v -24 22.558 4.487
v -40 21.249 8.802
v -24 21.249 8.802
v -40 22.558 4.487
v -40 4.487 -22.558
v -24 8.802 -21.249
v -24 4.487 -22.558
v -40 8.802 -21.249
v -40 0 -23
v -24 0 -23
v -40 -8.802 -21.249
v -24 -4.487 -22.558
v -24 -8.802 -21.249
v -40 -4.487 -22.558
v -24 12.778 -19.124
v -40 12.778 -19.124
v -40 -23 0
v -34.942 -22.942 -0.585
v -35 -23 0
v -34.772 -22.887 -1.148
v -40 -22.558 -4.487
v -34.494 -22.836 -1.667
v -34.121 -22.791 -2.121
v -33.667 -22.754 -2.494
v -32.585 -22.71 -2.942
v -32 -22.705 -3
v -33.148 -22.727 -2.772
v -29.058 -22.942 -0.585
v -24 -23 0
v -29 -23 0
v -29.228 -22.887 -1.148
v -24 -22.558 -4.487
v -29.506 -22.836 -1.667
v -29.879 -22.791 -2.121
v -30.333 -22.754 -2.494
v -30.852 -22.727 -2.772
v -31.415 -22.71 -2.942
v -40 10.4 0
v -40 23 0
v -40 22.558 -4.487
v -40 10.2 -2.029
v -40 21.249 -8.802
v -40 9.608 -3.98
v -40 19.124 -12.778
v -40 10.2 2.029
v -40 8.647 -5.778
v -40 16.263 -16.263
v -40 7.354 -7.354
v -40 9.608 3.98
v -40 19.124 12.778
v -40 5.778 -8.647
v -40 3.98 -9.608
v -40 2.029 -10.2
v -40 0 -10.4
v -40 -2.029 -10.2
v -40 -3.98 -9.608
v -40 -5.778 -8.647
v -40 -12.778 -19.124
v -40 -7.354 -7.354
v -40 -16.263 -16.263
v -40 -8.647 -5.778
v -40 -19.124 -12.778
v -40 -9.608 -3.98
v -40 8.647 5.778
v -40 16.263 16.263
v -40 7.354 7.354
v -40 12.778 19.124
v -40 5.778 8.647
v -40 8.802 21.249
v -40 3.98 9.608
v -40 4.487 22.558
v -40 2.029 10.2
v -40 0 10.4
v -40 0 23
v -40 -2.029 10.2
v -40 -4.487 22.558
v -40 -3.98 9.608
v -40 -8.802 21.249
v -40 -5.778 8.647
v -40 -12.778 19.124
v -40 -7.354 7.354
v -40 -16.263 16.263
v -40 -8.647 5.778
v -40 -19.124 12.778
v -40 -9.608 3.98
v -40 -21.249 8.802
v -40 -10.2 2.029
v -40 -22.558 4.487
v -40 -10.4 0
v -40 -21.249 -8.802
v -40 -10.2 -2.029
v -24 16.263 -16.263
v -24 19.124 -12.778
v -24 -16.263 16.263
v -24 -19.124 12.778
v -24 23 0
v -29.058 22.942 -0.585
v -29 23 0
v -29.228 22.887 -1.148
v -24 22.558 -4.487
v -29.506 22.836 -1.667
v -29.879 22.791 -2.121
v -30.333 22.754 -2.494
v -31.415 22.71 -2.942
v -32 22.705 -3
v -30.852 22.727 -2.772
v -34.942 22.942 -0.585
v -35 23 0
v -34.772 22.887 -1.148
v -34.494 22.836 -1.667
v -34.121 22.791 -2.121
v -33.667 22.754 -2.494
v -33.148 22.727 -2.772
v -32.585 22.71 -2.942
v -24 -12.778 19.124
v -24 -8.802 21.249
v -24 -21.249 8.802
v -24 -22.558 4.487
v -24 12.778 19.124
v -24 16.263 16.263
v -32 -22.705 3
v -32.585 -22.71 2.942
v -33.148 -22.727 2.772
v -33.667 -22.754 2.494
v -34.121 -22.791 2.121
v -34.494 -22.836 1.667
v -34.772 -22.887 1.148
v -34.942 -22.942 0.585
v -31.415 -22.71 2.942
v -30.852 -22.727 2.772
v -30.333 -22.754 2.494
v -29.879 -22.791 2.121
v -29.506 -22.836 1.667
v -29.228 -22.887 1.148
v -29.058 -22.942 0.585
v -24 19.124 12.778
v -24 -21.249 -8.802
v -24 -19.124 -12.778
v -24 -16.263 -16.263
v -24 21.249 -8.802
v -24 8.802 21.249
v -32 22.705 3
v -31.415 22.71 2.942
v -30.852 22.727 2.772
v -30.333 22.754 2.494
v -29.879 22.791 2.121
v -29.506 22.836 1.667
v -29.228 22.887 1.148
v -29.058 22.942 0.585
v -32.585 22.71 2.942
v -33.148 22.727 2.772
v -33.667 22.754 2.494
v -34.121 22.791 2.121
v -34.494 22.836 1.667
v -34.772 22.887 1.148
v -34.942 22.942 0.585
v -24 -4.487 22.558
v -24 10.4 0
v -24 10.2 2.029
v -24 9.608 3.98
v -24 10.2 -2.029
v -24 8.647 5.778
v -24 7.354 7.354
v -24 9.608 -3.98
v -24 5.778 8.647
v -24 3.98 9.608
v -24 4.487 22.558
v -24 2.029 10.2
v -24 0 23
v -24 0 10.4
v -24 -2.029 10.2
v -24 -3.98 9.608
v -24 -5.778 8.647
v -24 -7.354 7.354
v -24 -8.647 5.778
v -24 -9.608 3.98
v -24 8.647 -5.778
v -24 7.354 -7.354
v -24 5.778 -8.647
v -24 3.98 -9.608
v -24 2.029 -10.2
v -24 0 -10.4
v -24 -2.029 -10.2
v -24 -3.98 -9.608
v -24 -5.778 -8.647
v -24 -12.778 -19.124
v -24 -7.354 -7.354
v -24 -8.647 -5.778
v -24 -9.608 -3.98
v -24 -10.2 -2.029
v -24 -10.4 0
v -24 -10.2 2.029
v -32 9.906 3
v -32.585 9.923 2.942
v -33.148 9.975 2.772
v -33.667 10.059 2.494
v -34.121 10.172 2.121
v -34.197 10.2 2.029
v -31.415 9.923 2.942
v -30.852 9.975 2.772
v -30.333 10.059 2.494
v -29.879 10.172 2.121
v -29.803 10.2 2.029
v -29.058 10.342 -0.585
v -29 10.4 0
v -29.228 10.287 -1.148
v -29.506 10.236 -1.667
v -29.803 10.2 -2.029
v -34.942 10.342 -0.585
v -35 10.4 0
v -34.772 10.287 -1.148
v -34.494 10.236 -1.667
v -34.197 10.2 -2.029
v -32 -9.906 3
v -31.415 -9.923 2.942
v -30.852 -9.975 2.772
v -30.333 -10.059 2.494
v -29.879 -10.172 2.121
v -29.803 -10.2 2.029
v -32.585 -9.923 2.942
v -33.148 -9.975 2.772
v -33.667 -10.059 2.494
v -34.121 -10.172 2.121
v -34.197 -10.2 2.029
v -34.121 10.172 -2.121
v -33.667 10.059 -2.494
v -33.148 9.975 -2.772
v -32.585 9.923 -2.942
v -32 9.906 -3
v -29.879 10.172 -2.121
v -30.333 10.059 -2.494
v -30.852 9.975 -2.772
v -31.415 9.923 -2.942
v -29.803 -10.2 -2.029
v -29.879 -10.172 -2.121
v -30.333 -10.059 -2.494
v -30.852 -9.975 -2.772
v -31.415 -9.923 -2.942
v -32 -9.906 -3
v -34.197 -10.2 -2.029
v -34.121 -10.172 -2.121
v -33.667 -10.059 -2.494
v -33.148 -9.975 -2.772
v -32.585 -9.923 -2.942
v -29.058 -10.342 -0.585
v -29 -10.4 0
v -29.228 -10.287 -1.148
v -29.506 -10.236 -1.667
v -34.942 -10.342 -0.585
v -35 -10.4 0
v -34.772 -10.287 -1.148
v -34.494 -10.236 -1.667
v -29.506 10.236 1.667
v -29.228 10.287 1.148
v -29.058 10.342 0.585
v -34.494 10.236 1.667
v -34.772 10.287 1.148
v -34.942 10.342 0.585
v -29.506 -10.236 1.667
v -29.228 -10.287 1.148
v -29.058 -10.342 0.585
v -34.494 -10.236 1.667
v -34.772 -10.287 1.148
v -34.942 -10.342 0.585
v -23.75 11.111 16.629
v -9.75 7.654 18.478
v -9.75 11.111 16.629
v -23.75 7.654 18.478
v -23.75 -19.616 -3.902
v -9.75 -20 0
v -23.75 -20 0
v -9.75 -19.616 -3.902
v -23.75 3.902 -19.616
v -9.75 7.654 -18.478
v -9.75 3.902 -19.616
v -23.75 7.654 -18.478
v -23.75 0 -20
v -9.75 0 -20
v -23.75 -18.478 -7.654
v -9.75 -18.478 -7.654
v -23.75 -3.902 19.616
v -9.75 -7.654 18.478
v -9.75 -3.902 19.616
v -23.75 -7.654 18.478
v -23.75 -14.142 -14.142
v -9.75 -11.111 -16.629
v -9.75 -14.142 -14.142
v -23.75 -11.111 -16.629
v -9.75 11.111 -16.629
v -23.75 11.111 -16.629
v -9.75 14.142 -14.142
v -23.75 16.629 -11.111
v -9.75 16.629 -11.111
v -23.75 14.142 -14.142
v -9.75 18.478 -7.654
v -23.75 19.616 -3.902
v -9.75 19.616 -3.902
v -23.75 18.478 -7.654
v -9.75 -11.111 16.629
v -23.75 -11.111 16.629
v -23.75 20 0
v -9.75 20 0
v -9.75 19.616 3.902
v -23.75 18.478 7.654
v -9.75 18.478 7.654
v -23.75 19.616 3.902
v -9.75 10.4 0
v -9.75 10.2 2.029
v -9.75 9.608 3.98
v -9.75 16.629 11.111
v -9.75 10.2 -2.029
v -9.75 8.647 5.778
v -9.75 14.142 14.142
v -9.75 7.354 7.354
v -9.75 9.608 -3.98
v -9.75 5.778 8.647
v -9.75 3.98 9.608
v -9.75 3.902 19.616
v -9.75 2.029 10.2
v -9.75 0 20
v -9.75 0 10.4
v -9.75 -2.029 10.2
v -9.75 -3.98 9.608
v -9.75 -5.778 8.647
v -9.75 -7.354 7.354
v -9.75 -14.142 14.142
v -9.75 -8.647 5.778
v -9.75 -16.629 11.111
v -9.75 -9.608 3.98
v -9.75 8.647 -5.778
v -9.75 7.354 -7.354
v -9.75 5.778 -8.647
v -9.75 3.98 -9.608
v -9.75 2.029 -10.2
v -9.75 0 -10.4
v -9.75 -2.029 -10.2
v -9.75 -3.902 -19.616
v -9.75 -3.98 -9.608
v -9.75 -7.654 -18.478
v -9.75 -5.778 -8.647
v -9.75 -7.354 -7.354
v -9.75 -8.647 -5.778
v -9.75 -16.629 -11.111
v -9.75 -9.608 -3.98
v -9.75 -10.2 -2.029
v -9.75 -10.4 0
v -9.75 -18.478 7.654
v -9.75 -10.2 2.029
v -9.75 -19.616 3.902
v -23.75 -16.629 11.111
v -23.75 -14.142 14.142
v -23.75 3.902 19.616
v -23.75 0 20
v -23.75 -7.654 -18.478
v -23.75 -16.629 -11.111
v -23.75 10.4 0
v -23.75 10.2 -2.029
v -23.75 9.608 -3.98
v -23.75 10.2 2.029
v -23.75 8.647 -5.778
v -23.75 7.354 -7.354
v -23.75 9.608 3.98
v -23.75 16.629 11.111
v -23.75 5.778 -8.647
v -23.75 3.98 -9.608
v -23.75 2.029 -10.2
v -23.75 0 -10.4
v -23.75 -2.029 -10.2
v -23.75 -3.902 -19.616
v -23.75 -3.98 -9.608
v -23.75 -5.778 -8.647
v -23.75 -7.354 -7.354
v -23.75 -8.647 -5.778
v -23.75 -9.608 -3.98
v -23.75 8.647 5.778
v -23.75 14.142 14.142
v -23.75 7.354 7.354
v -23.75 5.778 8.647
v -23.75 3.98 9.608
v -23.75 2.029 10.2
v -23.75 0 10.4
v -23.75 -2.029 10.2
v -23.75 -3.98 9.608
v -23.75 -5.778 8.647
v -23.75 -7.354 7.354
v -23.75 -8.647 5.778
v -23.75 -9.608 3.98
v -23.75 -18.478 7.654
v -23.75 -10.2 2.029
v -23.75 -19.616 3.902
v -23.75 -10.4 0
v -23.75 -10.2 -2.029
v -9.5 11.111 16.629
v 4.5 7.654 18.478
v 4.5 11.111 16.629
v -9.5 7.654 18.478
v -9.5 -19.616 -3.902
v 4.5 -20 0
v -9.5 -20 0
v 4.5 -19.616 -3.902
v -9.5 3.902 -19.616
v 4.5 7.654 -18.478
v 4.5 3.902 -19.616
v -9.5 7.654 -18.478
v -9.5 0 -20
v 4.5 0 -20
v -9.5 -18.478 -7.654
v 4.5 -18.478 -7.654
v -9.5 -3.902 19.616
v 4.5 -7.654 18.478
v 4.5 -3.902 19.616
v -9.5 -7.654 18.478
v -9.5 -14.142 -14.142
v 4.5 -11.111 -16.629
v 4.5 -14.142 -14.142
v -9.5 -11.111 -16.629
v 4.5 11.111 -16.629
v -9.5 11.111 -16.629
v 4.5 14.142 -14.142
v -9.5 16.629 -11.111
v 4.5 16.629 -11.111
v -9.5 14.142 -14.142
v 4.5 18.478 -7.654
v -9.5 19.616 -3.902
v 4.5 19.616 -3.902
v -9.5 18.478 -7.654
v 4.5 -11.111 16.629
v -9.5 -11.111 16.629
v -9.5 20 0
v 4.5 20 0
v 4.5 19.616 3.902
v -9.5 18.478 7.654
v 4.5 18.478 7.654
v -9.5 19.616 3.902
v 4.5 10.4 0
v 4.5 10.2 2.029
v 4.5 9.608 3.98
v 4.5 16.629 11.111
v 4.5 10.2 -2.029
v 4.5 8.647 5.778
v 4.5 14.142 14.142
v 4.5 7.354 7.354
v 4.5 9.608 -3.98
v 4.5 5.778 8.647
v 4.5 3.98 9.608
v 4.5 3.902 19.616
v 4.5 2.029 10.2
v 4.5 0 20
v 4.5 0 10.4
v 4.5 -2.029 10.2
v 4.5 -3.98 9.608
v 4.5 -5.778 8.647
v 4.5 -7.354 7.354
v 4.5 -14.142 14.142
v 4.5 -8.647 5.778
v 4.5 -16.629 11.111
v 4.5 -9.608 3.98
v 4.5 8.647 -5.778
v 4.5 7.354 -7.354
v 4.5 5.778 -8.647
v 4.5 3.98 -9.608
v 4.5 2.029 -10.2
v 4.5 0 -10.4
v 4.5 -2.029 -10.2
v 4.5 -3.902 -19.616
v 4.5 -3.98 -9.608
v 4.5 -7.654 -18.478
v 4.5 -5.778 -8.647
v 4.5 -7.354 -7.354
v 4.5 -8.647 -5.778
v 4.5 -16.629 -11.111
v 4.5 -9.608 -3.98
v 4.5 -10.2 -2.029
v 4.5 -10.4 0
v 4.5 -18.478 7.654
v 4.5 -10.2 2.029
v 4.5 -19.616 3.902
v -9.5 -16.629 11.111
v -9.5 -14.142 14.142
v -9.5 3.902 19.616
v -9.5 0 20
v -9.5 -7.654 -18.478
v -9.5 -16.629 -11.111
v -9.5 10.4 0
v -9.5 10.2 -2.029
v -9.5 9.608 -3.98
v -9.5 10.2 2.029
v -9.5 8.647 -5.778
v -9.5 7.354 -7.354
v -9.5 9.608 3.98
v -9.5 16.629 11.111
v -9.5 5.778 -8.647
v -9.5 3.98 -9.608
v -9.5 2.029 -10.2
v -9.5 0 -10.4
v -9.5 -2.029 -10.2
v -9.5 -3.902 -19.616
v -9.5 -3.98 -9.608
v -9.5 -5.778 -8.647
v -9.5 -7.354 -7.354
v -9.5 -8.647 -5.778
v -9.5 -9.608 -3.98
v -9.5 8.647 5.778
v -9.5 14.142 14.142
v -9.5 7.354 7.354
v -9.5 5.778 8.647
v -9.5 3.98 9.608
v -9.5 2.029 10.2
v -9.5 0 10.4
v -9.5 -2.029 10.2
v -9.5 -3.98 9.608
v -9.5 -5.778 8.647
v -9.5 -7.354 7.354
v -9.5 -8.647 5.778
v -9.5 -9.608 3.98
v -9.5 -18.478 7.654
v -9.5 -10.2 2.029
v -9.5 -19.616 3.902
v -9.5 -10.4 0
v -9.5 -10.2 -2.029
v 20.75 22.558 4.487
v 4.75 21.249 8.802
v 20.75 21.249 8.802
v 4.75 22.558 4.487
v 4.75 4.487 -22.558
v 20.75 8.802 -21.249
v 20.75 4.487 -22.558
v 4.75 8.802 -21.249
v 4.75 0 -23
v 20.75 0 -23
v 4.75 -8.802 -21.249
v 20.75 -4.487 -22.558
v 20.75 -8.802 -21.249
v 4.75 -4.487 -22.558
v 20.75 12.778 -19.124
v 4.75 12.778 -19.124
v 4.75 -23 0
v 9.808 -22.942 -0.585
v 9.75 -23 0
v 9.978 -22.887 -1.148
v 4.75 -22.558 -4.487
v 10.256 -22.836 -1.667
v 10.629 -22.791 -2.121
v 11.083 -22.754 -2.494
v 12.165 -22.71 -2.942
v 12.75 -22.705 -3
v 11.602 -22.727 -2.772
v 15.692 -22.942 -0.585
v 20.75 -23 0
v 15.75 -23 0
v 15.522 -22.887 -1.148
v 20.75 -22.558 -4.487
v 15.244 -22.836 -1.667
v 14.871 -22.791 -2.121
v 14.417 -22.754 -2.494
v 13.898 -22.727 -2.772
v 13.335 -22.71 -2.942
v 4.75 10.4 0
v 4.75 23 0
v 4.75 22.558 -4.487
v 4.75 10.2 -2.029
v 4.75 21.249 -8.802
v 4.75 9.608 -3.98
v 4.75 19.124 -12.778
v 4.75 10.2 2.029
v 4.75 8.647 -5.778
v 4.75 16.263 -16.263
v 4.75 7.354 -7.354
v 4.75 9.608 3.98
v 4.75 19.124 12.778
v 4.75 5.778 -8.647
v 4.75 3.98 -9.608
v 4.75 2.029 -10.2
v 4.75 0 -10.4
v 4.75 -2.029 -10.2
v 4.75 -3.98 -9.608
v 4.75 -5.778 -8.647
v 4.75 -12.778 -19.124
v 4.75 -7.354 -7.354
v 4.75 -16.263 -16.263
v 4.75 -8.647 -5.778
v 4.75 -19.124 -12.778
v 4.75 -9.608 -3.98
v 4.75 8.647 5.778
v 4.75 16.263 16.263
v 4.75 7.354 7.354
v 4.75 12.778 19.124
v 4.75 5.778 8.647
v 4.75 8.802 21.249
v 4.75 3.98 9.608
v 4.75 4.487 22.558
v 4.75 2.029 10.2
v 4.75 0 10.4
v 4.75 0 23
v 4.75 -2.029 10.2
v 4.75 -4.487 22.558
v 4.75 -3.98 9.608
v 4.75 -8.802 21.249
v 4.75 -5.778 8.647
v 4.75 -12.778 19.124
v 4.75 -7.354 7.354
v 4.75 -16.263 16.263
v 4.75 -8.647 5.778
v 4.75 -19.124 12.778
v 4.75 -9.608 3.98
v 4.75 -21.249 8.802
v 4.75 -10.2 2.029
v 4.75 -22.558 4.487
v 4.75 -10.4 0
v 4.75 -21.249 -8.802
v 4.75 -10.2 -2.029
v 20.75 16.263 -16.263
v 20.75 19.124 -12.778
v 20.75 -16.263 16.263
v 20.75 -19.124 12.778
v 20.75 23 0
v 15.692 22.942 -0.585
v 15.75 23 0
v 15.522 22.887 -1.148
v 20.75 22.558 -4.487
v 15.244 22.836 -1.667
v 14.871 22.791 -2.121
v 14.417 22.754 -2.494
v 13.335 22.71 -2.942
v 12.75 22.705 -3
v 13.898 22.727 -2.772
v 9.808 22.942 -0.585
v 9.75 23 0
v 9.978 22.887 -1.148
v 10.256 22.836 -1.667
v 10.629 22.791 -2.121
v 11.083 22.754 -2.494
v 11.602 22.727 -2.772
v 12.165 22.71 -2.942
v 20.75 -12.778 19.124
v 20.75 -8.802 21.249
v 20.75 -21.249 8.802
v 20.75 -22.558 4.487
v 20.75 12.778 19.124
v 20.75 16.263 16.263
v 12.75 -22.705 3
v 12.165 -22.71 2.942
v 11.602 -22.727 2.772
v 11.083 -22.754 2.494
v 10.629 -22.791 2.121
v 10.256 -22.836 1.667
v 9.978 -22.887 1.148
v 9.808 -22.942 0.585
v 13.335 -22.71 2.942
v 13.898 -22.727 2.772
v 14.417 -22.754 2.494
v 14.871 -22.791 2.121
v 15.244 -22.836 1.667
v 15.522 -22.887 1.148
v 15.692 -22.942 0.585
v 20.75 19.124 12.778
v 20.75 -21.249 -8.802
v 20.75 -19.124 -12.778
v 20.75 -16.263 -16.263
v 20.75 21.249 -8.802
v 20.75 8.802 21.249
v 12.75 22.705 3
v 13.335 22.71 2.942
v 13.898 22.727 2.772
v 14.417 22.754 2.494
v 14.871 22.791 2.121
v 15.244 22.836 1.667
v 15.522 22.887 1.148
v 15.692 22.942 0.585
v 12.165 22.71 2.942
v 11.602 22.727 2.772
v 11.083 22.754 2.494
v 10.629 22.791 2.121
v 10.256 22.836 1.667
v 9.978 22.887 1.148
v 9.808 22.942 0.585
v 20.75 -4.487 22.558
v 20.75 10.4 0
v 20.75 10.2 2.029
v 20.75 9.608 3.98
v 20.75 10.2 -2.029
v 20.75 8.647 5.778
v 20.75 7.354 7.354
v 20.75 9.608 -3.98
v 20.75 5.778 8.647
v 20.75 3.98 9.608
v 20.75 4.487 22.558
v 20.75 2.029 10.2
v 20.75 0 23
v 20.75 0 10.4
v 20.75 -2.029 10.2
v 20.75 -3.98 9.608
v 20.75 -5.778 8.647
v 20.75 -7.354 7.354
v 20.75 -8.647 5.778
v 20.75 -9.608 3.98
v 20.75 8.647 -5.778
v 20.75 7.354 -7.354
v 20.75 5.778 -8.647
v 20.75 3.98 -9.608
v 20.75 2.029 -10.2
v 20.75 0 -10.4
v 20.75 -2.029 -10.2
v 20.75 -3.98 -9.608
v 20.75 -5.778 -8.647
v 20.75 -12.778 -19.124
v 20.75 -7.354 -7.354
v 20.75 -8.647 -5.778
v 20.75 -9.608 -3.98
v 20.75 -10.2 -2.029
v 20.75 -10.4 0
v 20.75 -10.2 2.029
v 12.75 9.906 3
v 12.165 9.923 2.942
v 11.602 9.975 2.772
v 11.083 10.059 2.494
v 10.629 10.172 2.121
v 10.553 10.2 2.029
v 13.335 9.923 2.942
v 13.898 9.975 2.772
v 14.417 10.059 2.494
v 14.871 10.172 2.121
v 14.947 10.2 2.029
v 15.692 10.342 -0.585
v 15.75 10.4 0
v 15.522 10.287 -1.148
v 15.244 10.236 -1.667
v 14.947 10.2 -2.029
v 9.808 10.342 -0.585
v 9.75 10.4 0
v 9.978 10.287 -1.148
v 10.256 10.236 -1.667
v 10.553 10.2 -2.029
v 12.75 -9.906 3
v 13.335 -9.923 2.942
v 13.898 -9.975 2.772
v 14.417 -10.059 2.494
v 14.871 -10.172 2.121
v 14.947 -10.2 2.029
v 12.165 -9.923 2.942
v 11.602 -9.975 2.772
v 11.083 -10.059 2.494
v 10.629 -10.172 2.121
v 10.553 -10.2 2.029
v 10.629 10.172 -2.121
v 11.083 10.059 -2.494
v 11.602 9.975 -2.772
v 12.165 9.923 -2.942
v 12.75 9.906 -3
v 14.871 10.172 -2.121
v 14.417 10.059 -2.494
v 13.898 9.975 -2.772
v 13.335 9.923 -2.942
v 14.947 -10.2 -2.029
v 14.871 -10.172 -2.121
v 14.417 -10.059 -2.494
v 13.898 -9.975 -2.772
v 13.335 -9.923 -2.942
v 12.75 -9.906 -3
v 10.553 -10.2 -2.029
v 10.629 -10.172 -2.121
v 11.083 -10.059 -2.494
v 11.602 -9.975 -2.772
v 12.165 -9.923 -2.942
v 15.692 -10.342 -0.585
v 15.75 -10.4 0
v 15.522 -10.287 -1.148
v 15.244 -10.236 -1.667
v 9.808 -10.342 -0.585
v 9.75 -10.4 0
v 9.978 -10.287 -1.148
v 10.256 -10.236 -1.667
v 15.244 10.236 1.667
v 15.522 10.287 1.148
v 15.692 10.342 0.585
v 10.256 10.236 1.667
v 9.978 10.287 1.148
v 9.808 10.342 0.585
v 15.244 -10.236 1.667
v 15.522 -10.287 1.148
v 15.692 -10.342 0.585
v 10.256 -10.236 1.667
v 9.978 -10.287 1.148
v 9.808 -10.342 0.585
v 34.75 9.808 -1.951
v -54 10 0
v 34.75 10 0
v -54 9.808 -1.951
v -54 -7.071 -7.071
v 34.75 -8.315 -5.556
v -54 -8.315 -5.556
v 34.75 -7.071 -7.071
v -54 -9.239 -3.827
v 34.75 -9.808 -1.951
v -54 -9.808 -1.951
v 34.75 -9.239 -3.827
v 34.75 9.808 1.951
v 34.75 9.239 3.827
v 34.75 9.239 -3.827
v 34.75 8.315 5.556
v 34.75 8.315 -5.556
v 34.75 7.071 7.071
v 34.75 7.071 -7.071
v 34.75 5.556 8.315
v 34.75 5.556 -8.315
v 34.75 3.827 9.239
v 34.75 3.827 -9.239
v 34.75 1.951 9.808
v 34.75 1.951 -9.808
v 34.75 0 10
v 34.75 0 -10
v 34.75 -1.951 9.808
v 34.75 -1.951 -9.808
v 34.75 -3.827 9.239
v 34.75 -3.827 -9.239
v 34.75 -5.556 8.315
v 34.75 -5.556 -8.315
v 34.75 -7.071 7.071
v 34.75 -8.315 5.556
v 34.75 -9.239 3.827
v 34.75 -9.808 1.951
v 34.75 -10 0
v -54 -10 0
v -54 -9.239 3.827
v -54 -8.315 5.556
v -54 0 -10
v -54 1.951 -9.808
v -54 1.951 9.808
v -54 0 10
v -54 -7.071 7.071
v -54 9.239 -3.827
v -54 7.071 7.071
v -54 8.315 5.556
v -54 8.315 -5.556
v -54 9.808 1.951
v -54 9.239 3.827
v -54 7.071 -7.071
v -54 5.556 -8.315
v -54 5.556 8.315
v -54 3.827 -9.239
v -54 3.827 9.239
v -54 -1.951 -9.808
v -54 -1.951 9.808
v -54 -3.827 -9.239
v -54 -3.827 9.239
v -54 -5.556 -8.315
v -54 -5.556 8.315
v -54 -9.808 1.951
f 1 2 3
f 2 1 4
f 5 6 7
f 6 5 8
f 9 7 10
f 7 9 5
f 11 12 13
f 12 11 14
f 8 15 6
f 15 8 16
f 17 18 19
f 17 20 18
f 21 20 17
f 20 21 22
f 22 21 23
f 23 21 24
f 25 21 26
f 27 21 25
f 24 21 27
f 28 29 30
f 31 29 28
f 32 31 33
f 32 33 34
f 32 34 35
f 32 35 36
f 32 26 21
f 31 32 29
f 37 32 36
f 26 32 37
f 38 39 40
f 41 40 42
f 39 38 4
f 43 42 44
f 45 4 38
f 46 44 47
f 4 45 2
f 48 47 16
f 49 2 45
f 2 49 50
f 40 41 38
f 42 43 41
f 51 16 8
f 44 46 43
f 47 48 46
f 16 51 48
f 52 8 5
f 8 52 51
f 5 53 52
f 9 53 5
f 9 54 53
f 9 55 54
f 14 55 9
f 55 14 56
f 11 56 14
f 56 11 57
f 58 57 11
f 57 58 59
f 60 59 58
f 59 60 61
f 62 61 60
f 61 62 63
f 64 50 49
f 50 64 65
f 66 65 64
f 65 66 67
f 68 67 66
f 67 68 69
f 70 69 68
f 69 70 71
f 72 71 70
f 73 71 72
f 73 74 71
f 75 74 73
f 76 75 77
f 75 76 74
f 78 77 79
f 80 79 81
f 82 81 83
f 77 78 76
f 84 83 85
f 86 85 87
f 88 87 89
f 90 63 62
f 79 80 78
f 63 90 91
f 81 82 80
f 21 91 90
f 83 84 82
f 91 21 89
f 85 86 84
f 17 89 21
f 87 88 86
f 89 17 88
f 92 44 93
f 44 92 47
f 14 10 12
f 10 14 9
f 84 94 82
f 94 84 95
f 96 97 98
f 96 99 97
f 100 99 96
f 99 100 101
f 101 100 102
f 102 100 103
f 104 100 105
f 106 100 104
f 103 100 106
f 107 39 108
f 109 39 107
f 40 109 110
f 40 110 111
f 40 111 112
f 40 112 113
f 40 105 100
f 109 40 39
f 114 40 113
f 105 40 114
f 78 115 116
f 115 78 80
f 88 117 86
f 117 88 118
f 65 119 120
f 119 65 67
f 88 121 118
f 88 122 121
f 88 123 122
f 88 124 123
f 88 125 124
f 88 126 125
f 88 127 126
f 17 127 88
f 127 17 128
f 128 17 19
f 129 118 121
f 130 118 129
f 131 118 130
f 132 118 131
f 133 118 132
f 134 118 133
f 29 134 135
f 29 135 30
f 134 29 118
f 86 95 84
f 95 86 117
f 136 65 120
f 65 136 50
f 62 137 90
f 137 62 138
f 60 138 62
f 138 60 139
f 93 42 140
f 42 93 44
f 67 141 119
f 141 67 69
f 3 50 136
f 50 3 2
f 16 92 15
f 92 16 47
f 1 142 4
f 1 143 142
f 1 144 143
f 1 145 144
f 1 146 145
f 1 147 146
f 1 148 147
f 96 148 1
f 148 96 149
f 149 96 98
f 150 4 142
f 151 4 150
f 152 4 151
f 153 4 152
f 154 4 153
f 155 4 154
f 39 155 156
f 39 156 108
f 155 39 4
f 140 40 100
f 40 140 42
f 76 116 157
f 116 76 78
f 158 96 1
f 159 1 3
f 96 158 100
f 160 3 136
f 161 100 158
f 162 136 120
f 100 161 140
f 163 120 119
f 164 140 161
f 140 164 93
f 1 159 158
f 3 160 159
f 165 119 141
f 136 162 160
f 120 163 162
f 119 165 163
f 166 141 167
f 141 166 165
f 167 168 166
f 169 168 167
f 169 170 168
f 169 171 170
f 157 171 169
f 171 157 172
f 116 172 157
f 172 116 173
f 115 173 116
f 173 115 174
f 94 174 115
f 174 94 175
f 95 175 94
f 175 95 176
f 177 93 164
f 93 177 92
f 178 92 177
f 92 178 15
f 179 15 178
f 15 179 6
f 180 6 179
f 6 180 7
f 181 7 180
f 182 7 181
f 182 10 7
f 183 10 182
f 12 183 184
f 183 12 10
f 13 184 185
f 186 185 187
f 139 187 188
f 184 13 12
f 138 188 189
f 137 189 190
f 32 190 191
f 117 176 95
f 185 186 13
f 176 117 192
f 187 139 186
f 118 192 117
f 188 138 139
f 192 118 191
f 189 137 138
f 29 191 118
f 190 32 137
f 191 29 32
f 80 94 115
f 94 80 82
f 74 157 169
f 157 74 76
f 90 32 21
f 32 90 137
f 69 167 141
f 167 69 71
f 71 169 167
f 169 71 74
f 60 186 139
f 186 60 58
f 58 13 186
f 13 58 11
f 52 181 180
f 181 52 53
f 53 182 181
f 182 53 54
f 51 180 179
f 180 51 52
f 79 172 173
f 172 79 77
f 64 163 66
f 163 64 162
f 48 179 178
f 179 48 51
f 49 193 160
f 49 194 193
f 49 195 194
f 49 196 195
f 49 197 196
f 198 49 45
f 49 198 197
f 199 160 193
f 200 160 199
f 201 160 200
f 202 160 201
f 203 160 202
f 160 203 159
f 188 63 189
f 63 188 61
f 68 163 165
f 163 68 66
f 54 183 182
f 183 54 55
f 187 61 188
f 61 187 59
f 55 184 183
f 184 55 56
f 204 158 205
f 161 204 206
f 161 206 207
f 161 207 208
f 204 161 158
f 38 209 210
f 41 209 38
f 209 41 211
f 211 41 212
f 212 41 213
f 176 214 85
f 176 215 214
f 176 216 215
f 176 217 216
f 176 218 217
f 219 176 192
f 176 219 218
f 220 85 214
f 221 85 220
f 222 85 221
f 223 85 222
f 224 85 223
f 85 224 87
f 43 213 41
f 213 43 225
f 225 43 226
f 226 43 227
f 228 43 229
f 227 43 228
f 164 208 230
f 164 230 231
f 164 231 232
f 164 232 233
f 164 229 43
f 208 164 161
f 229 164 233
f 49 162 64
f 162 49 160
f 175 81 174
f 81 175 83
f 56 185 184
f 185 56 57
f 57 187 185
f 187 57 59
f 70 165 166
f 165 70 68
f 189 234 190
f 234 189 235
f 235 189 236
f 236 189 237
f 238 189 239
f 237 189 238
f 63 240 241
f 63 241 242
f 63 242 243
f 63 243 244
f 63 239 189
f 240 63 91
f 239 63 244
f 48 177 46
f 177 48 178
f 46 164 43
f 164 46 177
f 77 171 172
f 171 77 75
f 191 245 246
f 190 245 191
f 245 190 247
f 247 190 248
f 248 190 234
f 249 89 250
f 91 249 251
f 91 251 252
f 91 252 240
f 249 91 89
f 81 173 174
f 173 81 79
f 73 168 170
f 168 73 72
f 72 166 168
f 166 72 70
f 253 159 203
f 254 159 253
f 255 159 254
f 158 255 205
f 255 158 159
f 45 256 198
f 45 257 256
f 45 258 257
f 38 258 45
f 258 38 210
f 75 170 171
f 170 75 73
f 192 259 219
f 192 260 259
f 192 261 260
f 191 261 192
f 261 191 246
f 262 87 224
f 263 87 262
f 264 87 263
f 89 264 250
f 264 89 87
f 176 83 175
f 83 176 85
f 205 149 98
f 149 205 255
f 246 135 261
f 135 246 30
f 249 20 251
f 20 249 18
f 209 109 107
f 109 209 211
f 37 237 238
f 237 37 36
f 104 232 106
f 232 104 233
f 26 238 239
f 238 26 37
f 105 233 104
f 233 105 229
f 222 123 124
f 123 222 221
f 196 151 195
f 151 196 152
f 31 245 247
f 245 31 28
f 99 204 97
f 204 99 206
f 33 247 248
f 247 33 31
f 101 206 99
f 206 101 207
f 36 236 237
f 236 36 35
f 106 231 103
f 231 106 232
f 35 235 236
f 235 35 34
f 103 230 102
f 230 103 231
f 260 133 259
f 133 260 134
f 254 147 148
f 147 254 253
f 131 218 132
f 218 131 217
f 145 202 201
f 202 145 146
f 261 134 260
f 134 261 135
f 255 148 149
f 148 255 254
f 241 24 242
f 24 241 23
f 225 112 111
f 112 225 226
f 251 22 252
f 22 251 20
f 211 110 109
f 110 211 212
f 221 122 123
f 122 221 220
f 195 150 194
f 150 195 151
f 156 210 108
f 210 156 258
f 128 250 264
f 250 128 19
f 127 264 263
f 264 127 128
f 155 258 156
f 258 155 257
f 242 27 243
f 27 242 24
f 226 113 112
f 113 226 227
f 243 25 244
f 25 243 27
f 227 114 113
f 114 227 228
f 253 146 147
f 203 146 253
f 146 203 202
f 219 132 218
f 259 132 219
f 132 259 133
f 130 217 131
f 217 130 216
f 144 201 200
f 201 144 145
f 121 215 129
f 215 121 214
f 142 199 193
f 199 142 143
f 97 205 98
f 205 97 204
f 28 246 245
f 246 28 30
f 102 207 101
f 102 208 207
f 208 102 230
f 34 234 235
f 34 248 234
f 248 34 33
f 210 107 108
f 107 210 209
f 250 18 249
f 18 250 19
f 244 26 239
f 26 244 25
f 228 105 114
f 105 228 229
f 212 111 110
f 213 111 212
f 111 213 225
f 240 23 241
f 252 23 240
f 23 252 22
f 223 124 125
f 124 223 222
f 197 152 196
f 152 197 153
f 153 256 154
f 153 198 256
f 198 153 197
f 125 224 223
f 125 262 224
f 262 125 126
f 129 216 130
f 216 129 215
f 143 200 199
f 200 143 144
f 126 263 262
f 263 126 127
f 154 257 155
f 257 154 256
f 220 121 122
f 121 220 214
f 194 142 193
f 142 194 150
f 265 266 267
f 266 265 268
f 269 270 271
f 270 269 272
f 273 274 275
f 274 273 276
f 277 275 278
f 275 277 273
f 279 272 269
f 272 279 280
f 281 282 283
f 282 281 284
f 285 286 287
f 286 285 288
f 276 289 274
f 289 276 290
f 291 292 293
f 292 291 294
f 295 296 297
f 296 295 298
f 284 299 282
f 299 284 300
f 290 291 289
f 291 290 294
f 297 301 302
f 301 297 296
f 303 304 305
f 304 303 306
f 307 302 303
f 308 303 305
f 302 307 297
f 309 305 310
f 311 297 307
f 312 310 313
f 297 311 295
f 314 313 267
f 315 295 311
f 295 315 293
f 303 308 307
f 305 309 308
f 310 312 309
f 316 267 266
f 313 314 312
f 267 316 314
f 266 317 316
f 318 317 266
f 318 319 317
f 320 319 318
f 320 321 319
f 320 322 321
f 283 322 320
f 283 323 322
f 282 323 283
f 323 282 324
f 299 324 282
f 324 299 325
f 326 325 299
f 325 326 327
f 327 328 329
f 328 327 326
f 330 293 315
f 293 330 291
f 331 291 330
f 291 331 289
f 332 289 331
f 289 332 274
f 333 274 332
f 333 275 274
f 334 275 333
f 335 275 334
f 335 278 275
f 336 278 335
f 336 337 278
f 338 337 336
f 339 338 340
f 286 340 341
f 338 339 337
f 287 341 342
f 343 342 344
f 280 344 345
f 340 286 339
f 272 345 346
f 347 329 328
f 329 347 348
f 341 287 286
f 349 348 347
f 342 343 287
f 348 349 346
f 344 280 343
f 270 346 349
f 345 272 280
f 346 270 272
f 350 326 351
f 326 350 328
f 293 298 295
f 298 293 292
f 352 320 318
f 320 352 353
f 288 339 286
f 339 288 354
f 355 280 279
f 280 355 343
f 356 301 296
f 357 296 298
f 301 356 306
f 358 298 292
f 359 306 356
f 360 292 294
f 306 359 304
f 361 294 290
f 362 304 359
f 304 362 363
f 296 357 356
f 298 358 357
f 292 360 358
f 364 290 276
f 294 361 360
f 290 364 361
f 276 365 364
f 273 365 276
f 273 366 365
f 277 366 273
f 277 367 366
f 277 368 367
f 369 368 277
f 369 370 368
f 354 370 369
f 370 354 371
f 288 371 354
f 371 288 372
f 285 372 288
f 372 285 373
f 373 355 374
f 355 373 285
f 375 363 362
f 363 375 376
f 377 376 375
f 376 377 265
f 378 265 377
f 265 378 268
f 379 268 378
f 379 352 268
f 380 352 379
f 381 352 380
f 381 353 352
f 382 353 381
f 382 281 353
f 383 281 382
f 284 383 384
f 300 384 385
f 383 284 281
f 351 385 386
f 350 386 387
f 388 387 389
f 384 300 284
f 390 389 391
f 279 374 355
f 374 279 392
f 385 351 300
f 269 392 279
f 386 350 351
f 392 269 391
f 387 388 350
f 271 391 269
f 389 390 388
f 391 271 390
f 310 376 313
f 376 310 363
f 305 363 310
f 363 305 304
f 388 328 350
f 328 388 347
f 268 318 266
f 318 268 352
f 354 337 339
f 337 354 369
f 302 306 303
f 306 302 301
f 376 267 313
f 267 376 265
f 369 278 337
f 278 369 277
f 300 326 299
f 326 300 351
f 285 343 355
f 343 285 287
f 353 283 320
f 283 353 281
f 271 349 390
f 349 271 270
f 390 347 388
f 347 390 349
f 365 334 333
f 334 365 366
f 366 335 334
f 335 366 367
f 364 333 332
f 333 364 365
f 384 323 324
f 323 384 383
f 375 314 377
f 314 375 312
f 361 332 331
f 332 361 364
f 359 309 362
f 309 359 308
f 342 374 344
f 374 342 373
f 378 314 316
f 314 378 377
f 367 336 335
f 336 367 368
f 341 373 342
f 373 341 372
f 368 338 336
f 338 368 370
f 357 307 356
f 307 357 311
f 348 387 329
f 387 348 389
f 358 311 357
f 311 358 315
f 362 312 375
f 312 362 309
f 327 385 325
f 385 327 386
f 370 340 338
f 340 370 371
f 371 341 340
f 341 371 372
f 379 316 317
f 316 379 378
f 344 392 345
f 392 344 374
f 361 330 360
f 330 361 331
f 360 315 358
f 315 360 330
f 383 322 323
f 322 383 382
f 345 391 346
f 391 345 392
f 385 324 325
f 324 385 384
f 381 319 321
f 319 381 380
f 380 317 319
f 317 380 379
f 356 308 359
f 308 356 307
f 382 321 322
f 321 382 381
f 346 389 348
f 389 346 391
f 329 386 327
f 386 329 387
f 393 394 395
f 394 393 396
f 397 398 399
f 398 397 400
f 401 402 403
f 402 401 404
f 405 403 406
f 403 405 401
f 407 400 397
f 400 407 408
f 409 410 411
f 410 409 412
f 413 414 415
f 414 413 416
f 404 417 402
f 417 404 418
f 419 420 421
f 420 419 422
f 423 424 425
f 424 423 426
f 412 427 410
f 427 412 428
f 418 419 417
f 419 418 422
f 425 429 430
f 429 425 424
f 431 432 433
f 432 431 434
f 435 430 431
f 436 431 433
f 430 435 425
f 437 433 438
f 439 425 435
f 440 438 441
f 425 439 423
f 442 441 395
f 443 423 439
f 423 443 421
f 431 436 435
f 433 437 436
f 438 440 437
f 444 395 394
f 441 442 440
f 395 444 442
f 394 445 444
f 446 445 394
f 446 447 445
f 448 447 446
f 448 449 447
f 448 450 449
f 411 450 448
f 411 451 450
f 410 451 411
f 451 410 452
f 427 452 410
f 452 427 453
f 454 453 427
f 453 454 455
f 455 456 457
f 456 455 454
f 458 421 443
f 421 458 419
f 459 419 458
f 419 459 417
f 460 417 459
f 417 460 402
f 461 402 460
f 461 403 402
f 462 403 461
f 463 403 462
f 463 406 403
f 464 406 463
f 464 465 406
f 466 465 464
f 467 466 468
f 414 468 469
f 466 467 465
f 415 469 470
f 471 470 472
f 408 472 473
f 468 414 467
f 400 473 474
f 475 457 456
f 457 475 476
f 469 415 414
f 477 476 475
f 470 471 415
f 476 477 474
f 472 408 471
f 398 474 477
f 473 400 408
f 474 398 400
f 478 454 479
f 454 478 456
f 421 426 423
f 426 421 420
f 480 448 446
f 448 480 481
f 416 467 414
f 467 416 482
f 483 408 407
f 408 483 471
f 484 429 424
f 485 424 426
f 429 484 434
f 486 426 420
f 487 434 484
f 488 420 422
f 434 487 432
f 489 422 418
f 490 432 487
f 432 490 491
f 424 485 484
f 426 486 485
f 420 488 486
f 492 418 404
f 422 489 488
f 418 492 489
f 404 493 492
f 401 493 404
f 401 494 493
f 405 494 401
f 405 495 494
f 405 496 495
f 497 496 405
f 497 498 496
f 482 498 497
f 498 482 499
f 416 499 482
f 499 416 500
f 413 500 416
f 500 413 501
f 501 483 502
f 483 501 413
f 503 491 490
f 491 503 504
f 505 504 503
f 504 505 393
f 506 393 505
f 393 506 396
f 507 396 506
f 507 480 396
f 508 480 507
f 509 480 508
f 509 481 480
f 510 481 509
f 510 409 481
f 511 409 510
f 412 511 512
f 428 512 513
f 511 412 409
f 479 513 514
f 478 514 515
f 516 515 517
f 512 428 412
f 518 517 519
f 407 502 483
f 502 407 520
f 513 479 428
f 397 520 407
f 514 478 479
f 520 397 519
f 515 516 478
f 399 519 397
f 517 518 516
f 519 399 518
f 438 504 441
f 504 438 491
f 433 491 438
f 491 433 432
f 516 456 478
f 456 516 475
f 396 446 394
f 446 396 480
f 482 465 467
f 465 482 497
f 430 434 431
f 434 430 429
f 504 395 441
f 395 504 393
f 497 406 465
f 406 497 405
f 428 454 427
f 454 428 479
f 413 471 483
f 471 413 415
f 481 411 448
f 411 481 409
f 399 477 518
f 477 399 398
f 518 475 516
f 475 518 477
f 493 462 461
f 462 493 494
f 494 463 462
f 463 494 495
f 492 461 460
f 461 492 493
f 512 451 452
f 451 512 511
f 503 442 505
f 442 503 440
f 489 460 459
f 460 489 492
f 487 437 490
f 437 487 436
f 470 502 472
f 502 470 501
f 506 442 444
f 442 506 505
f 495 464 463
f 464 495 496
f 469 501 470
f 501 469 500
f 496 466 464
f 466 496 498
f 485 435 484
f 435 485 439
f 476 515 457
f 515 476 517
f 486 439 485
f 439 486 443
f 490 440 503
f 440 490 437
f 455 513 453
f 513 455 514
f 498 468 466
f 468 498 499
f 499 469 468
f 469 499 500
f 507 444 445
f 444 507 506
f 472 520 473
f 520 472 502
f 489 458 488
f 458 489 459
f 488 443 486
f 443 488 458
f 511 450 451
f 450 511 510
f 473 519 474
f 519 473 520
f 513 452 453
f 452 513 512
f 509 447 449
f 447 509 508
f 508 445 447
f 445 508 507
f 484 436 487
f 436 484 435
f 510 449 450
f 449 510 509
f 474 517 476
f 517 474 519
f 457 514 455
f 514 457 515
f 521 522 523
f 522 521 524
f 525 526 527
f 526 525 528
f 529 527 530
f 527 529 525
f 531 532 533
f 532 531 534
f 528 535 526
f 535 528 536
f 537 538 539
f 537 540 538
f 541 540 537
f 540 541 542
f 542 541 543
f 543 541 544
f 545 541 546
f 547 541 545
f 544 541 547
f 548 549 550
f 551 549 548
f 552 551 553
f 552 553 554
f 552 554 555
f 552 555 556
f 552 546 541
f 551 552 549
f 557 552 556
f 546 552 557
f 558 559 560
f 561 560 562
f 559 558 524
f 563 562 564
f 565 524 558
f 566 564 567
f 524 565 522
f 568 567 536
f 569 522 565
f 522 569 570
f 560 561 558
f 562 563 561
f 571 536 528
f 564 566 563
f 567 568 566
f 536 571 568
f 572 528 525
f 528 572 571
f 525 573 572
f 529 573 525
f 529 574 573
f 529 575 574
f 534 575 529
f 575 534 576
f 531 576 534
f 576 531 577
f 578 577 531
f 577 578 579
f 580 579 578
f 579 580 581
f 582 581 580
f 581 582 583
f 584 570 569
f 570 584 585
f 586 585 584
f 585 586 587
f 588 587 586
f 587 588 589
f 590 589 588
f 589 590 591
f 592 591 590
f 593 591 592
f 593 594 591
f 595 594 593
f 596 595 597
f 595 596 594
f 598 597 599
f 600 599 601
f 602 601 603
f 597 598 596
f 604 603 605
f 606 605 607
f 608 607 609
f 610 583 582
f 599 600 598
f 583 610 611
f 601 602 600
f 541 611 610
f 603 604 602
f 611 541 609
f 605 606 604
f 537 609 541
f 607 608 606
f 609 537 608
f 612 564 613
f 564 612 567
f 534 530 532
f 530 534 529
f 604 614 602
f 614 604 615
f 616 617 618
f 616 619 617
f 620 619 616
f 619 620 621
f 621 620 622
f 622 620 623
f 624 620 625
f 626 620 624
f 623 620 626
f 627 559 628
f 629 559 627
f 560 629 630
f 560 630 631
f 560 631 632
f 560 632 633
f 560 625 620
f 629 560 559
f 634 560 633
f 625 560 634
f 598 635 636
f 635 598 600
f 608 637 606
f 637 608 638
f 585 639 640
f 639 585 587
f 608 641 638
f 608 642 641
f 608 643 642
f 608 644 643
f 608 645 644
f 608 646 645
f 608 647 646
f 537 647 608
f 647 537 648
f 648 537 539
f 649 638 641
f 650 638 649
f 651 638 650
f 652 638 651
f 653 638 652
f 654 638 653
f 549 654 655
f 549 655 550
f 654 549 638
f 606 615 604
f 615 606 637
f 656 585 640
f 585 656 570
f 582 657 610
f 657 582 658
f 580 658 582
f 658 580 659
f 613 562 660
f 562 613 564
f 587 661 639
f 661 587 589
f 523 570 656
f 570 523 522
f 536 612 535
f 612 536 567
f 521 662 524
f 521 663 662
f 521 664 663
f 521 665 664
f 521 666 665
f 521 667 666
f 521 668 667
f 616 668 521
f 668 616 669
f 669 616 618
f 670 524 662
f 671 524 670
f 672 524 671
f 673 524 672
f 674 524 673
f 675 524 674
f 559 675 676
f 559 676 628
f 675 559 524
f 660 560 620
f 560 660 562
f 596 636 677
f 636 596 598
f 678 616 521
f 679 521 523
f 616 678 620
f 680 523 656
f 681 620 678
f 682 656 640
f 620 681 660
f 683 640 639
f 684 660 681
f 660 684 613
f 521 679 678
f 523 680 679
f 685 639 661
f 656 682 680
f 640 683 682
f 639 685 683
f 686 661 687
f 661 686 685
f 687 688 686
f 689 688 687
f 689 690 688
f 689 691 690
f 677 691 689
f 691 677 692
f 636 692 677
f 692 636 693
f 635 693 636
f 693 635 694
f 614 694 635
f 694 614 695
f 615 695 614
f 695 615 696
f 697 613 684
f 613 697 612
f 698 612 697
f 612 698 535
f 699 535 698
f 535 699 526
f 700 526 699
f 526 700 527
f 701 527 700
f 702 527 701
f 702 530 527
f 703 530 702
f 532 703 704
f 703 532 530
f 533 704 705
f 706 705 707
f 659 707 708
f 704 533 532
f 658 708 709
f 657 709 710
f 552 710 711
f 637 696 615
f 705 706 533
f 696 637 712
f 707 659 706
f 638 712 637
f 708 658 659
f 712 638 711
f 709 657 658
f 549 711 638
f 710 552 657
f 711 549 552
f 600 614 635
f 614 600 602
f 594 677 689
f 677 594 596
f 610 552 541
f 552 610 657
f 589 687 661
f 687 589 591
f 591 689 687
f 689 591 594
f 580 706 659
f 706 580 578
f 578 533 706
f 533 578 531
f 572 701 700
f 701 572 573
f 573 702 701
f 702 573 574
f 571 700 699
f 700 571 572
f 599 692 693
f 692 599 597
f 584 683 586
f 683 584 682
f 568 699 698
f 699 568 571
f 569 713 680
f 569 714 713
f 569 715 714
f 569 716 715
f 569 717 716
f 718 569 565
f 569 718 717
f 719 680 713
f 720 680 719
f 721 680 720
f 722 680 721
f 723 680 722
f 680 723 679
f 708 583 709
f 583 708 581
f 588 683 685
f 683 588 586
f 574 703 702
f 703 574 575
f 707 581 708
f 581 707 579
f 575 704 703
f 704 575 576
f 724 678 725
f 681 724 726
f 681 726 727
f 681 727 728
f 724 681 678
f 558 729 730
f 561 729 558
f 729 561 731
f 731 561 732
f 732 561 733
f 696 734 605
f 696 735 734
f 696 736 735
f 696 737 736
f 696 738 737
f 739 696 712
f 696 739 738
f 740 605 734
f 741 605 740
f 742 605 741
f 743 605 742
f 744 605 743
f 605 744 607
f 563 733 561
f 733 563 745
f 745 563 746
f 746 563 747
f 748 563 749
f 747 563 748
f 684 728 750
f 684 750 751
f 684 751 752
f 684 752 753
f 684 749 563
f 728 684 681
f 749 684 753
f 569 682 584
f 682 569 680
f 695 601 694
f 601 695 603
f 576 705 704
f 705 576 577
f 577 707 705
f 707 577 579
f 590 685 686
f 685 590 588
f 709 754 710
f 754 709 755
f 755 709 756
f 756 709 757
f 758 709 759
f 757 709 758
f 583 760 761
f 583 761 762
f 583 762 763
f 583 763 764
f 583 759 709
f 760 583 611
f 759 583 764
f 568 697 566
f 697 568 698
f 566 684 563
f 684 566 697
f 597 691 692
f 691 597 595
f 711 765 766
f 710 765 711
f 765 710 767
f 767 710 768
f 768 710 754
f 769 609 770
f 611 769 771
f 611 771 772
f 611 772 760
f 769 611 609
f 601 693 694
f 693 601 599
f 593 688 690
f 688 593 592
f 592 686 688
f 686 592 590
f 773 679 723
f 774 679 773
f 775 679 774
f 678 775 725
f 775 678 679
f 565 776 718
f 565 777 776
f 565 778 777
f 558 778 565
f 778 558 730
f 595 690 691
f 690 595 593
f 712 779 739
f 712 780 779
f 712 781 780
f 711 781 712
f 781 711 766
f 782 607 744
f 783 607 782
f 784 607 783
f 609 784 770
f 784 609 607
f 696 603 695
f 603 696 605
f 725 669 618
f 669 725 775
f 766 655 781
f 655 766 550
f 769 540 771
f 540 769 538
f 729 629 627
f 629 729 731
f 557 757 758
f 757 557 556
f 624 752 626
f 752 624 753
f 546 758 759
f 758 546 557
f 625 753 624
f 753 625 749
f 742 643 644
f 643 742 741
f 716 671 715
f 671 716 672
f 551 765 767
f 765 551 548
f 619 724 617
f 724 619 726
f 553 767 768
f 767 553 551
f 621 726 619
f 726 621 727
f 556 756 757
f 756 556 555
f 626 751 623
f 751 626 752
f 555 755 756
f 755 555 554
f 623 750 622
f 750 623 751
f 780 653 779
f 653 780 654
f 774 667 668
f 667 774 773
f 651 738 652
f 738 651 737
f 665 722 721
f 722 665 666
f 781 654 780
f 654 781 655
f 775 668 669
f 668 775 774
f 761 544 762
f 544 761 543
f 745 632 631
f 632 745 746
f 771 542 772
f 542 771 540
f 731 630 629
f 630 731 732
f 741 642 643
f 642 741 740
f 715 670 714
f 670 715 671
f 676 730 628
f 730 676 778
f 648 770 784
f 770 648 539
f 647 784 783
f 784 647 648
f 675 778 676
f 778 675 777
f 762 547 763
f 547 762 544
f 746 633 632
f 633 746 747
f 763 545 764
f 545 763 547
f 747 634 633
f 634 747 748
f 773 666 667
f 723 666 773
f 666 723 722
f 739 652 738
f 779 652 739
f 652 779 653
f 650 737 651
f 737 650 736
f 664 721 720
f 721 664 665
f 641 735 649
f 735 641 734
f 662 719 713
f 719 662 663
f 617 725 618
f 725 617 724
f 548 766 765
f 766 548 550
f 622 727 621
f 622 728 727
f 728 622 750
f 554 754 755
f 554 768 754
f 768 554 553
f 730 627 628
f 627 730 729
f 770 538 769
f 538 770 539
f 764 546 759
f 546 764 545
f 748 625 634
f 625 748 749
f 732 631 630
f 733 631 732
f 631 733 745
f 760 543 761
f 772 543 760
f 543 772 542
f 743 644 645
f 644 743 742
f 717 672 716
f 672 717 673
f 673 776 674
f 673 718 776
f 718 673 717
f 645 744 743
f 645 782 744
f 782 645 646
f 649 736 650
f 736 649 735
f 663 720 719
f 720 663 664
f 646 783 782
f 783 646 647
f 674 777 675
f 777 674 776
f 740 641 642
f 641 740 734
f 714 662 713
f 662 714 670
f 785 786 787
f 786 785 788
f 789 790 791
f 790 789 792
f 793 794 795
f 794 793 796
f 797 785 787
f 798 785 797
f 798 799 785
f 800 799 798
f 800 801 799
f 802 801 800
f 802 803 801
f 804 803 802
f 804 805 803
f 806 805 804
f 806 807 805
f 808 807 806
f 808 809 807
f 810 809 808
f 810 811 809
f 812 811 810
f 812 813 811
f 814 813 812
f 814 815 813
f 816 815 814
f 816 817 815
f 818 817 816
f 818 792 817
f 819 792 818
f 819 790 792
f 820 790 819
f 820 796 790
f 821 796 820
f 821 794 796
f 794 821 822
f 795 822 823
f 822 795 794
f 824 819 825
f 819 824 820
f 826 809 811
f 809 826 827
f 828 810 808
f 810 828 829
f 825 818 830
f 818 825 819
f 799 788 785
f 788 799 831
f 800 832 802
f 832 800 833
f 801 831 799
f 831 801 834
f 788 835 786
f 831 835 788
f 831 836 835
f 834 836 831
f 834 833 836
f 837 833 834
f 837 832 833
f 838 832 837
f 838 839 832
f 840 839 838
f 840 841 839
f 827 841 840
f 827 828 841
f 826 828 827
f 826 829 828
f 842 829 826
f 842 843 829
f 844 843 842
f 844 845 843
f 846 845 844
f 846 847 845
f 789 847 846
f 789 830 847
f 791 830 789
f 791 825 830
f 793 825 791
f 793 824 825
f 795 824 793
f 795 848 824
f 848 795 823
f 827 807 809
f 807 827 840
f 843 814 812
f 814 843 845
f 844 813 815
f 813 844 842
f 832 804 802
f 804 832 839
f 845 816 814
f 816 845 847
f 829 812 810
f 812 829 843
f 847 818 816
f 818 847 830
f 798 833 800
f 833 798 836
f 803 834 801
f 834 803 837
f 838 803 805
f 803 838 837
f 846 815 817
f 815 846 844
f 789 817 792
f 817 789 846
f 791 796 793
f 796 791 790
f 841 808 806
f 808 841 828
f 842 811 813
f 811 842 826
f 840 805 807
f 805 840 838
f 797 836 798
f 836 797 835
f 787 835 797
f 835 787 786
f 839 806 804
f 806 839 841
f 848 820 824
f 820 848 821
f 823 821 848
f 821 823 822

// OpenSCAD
$fn = 32;

// ------------------------------------------------------------------------
// Shaft with rings and collars: d20 shaft, 4 rings
// Every part is its own module, assembly() places them once.
// ------------------------------------------------------------------------

// --- part 1 ---
module shaft() {
  translate([0, 0, -44.375]) cylinder(h = 88.75, d = 20);
}

// --- part 2 ---
module collar_a() {
  difference() {
    cylinder(h = 16, d = 46);
    translate([0, 0, -1]) cylinder(h = 18, d = 20.8);
    translate([0, 0, 8]) rotate([90, 0, 0]) cylinder(h = 48, d = 6, center = true);
  }
}

// --- part 3 ---
module spacer_a() {
  difference() {
      translate([0, 0, 0]) cylinder(h = 14, d = 40);
      translate([0, 0, -1]) cylinder(h = 16, d = 20.8);
    }
}

// --- part 4 ---
module spacer_b() {
  difference() {
      translate([0, 0, 0]) cylinder(h = 14, d = 40);
      translate([0, 0, -1]) cylinder(h = 16, d = 20.8);
    }
}

// --- part 5 ---
module collar_b() {
  difference() {
    cylinder(h = 16, d = 46);
    translate([0, 0, -1]) cylinder(h = 18, d = 20.8);
    translate([0, 0, 8]) rotate([90, 0, 0]) cylinder(h = 48, d = 6, center = true);
  }
}

// --- assembly ---
module assembly() {
  translate([-9.625, 0, 0]) rotate([0, 90, 0]) shaft();
  translate([-40, 0, 0]) rotate([0, 90, 0]) collar_a();
  translate([-23.75, 0, 0]) rotate([0, 90, 0]) spacer_a();
  translate([-9.5, 0, 0]) rotate([0, 90, 0]) spacer_b();
  translate([4.75, 0, 0]) rotate([0, 90, 0]) collar_b();
}

assembly();
